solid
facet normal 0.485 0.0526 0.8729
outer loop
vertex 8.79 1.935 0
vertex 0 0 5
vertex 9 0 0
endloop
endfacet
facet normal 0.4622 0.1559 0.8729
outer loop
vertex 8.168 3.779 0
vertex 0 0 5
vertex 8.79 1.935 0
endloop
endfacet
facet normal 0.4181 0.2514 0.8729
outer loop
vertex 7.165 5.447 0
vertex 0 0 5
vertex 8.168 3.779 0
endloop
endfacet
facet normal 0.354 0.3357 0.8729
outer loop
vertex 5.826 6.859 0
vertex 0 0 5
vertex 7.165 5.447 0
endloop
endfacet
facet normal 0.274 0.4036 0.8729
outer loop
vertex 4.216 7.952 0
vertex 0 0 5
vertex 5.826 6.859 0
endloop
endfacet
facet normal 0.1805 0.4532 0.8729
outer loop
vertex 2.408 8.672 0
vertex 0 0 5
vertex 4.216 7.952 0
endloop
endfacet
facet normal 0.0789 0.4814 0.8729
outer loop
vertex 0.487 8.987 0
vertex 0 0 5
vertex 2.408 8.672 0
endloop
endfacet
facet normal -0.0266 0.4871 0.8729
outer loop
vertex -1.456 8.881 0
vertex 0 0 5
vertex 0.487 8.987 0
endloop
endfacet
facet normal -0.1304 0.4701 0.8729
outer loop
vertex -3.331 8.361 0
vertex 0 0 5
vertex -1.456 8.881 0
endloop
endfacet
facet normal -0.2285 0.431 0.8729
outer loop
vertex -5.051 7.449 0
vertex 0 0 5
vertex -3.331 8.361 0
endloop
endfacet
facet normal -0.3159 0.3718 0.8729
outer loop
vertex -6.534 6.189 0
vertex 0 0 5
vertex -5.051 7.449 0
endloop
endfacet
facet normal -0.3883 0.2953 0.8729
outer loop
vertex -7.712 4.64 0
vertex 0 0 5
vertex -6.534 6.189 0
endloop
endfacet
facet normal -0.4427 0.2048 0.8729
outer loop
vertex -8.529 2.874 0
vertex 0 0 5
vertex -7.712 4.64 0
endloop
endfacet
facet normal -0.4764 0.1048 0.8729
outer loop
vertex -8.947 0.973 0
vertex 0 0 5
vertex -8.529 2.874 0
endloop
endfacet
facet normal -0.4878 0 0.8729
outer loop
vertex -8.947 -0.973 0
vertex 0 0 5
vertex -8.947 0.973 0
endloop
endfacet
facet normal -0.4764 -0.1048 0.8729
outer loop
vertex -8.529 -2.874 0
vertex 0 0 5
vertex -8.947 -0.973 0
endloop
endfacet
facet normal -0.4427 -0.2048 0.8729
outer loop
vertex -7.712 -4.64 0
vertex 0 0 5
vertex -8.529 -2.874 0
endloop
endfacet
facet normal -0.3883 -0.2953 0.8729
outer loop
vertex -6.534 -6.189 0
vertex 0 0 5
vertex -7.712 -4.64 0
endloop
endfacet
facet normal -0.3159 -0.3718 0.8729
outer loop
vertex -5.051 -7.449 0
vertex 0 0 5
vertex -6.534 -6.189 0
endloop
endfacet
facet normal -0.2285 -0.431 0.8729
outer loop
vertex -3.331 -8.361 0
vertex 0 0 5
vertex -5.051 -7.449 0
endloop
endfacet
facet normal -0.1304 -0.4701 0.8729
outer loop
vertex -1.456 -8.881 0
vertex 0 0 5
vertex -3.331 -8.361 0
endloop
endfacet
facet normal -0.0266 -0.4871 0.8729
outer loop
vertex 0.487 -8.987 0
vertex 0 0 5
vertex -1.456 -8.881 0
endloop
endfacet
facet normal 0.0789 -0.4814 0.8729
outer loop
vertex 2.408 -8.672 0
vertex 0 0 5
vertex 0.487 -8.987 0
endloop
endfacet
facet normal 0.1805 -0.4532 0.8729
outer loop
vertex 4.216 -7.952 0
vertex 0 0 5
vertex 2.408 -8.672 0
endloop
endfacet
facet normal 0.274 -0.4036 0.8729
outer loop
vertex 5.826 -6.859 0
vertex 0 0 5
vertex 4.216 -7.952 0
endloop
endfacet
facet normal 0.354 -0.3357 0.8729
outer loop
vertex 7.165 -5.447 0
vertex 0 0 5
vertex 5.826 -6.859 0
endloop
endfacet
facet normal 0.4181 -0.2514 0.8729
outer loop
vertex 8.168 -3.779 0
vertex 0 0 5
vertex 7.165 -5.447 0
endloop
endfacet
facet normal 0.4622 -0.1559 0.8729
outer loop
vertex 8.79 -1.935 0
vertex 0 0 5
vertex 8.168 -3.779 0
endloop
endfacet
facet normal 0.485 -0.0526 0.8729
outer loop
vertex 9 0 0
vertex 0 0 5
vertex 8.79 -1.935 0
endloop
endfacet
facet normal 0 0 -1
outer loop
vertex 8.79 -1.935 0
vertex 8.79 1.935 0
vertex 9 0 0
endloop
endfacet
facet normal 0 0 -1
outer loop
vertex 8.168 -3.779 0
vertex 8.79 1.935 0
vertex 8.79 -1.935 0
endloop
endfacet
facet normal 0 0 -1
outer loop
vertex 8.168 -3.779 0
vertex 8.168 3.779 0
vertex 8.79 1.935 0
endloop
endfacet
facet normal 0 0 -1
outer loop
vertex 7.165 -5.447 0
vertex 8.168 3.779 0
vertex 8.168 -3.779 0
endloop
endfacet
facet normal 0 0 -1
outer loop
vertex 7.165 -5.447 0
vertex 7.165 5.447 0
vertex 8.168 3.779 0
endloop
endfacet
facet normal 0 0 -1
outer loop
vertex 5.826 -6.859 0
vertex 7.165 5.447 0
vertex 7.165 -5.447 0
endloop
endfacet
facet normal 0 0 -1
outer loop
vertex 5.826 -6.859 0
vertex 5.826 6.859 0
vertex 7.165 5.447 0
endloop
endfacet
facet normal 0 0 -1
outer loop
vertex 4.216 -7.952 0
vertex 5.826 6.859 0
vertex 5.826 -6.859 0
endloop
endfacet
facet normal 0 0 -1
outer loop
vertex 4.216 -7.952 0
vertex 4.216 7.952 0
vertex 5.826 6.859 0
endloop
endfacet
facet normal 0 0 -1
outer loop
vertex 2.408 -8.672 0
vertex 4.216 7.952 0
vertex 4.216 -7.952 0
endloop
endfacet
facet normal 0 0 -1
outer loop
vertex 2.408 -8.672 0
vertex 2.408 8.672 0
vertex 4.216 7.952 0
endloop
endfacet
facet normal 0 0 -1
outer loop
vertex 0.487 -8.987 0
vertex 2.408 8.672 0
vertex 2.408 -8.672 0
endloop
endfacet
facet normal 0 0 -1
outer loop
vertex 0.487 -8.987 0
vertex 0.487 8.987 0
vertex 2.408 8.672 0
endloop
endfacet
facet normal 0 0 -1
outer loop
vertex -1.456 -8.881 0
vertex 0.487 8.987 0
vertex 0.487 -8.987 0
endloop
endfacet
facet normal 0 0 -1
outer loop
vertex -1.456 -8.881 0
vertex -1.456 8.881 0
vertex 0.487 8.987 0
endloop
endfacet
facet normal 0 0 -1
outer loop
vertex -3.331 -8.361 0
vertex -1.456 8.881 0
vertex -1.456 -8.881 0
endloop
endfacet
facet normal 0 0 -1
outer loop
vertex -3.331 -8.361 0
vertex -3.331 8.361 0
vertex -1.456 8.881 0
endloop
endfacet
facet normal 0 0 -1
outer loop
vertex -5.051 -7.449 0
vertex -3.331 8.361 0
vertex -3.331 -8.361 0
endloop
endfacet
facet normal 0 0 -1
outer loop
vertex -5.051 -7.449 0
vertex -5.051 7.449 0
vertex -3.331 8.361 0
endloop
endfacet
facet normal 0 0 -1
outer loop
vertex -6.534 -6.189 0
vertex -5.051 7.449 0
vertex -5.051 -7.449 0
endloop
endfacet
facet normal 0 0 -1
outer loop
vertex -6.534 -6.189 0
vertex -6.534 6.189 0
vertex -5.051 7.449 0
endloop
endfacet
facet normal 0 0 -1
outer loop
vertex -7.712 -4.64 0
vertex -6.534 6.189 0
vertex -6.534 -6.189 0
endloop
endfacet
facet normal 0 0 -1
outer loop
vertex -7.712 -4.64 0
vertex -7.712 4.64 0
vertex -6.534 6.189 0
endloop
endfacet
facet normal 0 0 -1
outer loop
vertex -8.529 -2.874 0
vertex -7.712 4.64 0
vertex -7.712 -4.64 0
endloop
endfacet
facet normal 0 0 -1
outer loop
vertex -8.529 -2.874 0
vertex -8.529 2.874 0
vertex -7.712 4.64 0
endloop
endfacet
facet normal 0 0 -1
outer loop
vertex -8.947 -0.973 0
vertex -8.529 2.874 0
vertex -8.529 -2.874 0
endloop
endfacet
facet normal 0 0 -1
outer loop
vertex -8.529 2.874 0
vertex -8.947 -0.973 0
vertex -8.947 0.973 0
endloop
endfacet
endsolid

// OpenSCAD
// Generated by SolidPython 1.0.1 on 2020-07-29 00:46:43


cylinder(h = 5, r1 = 9, r2 = 0);
/***********************************************
*********      SolidPython code:      **********
************************************************
 
# import packages: SolidPython
from solid import *
from solid.utils import *
from itertools import chain, combinations, permutations


class Resize:

    def __init__(self, scad_file):
        self.scad_file = scad_file
        #self.scad_file = import_scad(scad_file)
        # cone/cylinder param:
        self.r1 = 0
        self.r2 = 0
        self.h = 0
        # rectangular prism param:
        self.w = 0
        self.l = 0
        # ellipse param:
        self.r = 0

    # import OpenScad code (file name corresponds to shape)


    # classify shape + parameters
    def assign(self, param1, param2, param3):
        if self.scad_file == 'cone.scad':
            self.r1 = param1
            self.r2 = param2
            self.h = param3
        elif self.scad_file == 'cylinder.scad':
            self.r1 = param1
            self.r2 = param2
            self.h = param3
        elif self.scad_file == 'rectangularPrism.scad':
            self.h = param1
            self.l = param2
            self.w = param3
        else:
            self.r = param1
            self.h = param2

    # resize parameters
    def iterate(self):
        x = range(3, 20, 2)
        i = 1
        if self.scad_file == 'cone.scad':
            tempList = list(permutations(x, 2))
            for temp in tempList:
                param1 = temp[0]
                param2 = temp[1]
                filepath = 'produced_scad_files/' + 'cone' + str(param1) + '_' + str(param2) + '_' + '.scad'
                scad_render_to_file(cylinder(h=param1, r1=param2, r2=0), filepath)

        elif self.scad_file == 'cylinder.scad':
            tempList = list(permutations(x, 3))
            for temp in tempList:
                param1 = temp[0]
                param2 = temp[1]
                filepath = 'produced_scad_files/' + 'cylinder' + str(param1) + '_' + str(param2) + '_' + '.scad'
                scad_render_to_file(cylinder(h=param1, r1=param2, r2=param2), filepath)

        elif self.scad_file == 'rectangularPrism.scad':
            tempList = list(permutations(x, 3))
            for temp in tempList:
                param1 = temp[0]
                param2 = temp[1]
                param3 = temp[2]
                filepath = 'produced_scad_files/' + 'rectangularPrism' + str(param1) + '_' + str(param2) + '_' + str(
                    param3) + '.scad'
                scad_render_to_file(cube(size=(param1, param2, param3)), filepath)

        elif self.scad_file == 'ellipse.scad':
            tempList = list(permutations(x, 4))
            for temp in tempList:
                param1 = temp[0]
                param2 = temp[1]
                param3 = temp[2]
                param4 = temp[3]
                filepath = 'produced_scad_files/' + 'ellipse' + str(param1) + '_' + str(param2) + '_' + str(param3) + '_' + str(param4) + '.scad'
                scad_render_to_file(scale([param1, param2, param3])(sphere(r=param4)), filepath)

    def render_to_scadfile(self):
        scad_render_to_file(scad, 'example.scad') 
 
************************************************/
